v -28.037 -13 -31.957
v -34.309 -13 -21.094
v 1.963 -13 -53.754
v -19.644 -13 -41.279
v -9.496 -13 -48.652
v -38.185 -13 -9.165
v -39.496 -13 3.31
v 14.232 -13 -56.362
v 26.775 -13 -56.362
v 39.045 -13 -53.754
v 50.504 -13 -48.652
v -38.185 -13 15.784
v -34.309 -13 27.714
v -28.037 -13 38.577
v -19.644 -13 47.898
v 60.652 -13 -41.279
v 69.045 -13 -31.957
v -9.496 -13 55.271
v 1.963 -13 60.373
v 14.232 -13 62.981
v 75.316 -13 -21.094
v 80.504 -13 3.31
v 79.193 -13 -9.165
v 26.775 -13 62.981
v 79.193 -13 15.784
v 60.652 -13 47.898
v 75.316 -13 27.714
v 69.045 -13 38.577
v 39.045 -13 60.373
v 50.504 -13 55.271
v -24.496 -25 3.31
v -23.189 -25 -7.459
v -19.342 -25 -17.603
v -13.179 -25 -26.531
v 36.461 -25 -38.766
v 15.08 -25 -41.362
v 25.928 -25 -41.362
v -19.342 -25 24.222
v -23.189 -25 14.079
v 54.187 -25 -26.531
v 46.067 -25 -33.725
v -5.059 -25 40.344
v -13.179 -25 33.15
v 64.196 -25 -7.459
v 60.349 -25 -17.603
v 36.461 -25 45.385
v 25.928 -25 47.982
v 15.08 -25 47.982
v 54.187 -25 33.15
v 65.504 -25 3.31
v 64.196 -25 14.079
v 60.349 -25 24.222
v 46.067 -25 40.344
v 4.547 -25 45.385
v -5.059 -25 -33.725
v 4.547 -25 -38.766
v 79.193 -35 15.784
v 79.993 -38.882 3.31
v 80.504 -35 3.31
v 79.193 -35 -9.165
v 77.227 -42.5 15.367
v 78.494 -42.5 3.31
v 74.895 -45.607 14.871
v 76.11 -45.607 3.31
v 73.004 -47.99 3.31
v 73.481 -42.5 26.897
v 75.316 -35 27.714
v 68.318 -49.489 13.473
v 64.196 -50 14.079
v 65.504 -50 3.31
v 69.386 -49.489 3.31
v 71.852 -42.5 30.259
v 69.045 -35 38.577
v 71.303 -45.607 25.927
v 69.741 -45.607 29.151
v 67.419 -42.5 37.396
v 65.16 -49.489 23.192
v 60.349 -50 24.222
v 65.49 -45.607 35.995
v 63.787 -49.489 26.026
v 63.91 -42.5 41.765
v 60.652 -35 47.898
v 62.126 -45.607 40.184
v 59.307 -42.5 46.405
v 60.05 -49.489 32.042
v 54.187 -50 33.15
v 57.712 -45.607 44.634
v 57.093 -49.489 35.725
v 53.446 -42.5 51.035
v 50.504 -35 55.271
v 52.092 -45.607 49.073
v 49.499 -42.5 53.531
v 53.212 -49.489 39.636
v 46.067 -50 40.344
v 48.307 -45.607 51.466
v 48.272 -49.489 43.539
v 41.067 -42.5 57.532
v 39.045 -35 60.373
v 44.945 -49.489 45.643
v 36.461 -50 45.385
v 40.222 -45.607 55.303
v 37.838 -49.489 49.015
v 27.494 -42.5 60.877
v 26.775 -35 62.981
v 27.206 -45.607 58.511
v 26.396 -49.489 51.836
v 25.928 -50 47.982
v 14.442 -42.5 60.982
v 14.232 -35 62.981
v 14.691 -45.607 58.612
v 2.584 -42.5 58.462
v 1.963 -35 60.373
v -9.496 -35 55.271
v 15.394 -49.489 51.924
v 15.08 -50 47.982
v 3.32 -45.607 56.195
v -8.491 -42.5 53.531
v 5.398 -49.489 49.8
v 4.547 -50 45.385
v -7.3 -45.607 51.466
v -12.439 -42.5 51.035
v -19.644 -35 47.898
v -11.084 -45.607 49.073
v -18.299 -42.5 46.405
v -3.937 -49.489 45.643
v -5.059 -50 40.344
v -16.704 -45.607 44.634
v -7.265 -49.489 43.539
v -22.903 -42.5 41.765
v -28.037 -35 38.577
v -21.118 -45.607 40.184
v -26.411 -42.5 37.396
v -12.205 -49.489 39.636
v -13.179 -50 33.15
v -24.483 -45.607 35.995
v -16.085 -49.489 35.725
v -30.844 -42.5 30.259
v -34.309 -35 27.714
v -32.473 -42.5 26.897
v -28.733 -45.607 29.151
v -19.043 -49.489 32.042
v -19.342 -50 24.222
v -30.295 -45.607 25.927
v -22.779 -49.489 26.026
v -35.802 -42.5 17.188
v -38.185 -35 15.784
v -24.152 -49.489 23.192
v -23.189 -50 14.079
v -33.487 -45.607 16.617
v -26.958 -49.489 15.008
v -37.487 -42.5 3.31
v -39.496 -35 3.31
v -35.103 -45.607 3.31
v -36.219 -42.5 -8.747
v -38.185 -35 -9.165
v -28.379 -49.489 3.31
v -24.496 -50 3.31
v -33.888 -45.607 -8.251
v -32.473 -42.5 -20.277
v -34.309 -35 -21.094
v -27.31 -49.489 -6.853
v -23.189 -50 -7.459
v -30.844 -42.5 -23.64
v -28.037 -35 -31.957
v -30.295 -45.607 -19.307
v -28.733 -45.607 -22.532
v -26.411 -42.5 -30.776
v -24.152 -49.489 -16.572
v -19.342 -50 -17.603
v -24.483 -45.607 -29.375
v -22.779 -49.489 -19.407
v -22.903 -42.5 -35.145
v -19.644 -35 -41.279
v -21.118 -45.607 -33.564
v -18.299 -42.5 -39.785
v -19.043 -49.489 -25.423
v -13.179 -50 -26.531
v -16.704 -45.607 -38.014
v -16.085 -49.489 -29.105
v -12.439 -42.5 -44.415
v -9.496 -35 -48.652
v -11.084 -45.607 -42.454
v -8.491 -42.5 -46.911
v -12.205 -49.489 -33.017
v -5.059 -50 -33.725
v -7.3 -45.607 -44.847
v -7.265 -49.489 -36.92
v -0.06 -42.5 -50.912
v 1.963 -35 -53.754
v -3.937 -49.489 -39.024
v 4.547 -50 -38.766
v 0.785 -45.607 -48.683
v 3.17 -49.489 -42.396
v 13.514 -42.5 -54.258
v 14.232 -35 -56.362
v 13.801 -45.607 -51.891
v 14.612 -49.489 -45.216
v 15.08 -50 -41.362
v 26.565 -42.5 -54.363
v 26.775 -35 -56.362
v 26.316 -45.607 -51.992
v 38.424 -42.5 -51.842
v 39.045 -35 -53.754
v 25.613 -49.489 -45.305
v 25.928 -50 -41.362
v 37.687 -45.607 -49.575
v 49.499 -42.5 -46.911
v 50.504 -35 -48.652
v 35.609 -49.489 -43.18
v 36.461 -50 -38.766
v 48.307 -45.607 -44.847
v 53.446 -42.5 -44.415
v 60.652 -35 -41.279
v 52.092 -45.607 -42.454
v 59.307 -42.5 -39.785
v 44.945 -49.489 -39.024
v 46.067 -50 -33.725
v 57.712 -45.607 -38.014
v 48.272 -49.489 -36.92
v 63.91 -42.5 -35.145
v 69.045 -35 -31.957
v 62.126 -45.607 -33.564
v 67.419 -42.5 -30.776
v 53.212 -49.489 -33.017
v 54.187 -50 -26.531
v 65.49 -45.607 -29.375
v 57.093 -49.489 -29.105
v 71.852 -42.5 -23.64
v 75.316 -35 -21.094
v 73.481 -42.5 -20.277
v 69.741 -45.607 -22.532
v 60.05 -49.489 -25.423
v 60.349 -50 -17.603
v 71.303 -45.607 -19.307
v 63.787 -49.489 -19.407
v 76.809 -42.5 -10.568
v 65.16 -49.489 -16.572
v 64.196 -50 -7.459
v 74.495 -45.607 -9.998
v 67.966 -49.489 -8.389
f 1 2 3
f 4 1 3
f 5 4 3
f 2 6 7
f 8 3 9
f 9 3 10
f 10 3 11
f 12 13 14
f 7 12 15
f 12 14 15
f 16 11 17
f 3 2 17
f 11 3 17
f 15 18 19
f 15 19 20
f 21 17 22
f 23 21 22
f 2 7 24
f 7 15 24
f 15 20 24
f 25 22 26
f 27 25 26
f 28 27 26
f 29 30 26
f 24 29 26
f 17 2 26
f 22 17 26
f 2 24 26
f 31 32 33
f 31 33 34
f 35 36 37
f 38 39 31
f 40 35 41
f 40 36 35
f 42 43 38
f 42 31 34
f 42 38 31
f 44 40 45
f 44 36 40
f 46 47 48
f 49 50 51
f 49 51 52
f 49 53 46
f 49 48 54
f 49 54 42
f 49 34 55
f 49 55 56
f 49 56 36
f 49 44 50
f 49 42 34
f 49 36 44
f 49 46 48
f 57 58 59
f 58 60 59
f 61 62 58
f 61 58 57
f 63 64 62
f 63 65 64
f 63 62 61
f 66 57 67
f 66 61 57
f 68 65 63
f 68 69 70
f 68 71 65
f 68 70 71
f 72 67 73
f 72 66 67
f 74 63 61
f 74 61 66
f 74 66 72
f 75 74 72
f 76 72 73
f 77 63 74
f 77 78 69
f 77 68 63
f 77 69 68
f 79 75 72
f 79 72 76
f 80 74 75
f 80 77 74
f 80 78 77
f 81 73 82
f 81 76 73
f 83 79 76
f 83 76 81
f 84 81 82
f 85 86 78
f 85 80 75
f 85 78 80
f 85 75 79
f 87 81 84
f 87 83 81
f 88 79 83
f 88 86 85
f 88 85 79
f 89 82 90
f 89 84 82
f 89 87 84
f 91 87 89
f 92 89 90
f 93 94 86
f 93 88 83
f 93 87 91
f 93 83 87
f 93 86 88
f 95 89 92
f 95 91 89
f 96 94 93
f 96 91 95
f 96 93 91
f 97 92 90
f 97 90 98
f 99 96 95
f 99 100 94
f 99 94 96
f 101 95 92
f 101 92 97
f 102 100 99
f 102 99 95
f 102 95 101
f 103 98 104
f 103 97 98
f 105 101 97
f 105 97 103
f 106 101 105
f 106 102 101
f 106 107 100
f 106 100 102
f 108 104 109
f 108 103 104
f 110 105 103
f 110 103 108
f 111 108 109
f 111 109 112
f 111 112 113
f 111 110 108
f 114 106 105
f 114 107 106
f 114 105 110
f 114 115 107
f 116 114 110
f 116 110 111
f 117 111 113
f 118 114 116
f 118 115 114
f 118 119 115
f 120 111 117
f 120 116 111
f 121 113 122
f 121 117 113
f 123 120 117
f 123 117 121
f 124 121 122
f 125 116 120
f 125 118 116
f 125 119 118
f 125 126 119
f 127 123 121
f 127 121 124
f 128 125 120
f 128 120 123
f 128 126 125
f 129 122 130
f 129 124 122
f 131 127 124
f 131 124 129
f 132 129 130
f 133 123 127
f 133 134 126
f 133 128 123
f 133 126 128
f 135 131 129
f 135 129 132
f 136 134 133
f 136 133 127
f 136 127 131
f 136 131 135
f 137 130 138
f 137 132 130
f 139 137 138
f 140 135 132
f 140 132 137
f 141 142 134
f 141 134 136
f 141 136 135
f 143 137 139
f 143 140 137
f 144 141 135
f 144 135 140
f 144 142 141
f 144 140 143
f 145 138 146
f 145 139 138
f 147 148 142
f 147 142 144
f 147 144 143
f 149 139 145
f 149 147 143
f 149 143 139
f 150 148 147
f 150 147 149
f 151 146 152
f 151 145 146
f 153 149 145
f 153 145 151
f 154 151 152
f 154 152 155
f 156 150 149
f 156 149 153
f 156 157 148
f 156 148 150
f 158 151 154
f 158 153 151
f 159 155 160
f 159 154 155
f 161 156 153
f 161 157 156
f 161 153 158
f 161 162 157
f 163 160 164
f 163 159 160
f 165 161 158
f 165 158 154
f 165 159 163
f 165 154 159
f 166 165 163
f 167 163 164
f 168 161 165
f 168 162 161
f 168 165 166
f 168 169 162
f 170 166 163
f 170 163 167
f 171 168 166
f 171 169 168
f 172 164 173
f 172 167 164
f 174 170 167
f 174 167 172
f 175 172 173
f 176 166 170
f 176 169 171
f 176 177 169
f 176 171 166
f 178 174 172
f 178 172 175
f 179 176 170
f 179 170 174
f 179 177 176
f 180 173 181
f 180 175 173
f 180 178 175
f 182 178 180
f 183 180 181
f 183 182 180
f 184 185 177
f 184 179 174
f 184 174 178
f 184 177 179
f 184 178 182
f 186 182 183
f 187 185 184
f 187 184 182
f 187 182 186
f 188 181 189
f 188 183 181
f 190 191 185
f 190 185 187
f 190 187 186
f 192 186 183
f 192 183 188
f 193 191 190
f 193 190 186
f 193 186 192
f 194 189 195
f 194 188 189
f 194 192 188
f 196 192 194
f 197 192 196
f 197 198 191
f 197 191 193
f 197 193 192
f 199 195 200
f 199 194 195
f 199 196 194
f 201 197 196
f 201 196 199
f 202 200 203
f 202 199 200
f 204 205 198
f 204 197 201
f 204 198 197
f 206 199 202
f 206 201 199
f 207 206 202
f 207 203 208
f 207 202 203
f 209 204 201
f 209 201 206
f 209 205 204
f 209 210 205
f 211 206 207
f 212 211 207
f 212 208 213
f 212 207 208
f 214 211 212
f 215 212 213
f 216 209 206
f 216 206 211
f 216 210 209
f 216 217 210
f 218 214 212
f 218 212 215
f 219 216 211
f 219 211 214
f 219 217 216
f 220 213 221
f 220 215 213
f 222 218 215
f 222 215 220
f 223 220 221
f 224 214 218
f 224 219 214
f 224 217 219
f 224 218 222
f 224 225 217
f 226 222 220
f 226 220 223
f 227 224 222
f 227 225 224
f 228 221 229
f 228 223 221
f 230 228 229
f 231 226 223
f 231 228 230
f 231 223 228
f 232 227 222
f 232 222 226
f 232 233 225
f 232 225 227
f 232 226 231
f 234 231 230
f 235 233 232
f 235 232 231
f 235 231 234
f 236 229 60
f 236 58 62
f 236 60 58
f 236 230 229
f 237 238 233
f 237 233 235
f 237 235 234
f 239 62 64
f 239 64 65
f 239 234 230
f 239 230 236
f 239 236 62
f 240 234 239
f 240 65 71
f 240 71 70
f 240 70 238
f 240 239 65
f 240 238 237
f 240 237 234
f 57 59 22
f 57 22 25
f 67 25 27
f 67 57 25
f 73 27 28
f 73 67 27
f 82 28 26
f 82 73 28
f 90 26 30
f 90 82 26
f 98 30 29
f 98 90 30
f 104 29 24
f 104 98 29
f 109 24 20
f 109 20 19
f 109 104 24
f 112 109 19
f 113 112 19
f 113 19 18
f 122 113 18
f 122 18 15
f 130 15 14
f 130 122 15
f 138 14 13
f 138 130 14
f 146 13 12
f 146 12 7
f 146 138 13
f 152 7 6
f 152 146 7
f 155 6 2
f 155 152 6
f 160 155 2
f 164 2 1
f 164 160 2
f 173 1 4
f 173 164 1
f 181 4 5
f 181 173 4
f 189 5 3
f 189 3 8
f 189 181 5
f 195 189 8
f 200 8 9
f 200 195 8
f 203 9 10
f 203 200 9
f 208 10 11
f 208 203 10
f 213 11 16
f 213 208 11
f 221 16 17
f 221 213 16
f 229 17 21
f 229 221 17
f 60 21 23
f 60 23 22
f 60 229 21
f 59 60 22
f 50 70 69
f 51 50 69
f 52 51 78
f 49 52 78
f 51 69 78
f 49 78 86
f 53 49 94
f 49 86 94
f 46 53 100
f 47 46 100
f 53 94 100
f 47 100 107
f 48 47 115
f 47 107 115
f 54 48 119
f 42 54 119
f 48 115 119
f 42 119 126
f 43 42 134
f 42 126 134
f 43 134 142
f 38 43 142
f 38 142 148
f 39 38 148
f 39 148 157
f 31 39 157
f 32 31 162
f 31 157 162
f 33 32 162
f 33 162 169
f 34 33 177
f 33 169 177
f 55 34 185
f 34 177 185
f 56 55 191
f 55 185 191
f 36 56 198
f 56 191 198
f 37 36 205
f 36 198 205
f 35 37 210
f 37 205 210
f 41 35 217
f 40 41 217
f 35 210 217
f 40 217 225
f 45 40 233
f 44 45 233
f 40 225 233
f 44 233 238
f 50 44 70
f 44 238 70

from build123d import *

# Parameters (mm, degrees)
F0_R     = 60
F1_DEPTH = 25
F2_DEPTH = 25
F3_DEPTH = 37
F4_R     = 15
F5_R     = 45
F6_DEPTH = 25


with BuildPart() as f1:
    # F0 (on Front) → F1 (new body)
    with BuildSketch(Plane.XZ):
        with Locations((20.5037463456, 3.3097660635)):
            Circle(F0_R)
    extrude(amount=F1_DEPTH)

    # F2 (add): faces of the model
    f2_faces = [f1.faces().sort_by_distance(p)[0] for p in [
        (20.5037463456, -25, 3.3097660635),
        (20.5037463456, 0, 3.3097660635),
    ]]
    extrude(f2_faces, amount=F2_DEPTH, dir=(0, -1, 0))

    # F3 (intersect): a face of the model
    f3_faces = [f1.faces().sort_by_distance(p)[0] for p in [
        (20.5037463456, -50, 3.3097660635),
    ]]
    extrude(f3_faces, amount=-F3_DEPTH, mode=Mode.INTERSECT)

    # F4
    f4_edges = [f1.edges().sort_by_distance(p)[0] for p in [
        (-39.496254, -50, 3.309766),
    ]]
    fillet(f4_edges, radius=F4_R)

    # F5 (on face) → F6 (cut)
    with BuildSketch(Plane.XZ.offset(50)):
        with Locations((20.5037463456, 3.3097660635)):
            Circle(F5_R)
    extrude(amount=-F6_DEPTH, mode=Mode.SUBTRACT)


solid = f1.part
